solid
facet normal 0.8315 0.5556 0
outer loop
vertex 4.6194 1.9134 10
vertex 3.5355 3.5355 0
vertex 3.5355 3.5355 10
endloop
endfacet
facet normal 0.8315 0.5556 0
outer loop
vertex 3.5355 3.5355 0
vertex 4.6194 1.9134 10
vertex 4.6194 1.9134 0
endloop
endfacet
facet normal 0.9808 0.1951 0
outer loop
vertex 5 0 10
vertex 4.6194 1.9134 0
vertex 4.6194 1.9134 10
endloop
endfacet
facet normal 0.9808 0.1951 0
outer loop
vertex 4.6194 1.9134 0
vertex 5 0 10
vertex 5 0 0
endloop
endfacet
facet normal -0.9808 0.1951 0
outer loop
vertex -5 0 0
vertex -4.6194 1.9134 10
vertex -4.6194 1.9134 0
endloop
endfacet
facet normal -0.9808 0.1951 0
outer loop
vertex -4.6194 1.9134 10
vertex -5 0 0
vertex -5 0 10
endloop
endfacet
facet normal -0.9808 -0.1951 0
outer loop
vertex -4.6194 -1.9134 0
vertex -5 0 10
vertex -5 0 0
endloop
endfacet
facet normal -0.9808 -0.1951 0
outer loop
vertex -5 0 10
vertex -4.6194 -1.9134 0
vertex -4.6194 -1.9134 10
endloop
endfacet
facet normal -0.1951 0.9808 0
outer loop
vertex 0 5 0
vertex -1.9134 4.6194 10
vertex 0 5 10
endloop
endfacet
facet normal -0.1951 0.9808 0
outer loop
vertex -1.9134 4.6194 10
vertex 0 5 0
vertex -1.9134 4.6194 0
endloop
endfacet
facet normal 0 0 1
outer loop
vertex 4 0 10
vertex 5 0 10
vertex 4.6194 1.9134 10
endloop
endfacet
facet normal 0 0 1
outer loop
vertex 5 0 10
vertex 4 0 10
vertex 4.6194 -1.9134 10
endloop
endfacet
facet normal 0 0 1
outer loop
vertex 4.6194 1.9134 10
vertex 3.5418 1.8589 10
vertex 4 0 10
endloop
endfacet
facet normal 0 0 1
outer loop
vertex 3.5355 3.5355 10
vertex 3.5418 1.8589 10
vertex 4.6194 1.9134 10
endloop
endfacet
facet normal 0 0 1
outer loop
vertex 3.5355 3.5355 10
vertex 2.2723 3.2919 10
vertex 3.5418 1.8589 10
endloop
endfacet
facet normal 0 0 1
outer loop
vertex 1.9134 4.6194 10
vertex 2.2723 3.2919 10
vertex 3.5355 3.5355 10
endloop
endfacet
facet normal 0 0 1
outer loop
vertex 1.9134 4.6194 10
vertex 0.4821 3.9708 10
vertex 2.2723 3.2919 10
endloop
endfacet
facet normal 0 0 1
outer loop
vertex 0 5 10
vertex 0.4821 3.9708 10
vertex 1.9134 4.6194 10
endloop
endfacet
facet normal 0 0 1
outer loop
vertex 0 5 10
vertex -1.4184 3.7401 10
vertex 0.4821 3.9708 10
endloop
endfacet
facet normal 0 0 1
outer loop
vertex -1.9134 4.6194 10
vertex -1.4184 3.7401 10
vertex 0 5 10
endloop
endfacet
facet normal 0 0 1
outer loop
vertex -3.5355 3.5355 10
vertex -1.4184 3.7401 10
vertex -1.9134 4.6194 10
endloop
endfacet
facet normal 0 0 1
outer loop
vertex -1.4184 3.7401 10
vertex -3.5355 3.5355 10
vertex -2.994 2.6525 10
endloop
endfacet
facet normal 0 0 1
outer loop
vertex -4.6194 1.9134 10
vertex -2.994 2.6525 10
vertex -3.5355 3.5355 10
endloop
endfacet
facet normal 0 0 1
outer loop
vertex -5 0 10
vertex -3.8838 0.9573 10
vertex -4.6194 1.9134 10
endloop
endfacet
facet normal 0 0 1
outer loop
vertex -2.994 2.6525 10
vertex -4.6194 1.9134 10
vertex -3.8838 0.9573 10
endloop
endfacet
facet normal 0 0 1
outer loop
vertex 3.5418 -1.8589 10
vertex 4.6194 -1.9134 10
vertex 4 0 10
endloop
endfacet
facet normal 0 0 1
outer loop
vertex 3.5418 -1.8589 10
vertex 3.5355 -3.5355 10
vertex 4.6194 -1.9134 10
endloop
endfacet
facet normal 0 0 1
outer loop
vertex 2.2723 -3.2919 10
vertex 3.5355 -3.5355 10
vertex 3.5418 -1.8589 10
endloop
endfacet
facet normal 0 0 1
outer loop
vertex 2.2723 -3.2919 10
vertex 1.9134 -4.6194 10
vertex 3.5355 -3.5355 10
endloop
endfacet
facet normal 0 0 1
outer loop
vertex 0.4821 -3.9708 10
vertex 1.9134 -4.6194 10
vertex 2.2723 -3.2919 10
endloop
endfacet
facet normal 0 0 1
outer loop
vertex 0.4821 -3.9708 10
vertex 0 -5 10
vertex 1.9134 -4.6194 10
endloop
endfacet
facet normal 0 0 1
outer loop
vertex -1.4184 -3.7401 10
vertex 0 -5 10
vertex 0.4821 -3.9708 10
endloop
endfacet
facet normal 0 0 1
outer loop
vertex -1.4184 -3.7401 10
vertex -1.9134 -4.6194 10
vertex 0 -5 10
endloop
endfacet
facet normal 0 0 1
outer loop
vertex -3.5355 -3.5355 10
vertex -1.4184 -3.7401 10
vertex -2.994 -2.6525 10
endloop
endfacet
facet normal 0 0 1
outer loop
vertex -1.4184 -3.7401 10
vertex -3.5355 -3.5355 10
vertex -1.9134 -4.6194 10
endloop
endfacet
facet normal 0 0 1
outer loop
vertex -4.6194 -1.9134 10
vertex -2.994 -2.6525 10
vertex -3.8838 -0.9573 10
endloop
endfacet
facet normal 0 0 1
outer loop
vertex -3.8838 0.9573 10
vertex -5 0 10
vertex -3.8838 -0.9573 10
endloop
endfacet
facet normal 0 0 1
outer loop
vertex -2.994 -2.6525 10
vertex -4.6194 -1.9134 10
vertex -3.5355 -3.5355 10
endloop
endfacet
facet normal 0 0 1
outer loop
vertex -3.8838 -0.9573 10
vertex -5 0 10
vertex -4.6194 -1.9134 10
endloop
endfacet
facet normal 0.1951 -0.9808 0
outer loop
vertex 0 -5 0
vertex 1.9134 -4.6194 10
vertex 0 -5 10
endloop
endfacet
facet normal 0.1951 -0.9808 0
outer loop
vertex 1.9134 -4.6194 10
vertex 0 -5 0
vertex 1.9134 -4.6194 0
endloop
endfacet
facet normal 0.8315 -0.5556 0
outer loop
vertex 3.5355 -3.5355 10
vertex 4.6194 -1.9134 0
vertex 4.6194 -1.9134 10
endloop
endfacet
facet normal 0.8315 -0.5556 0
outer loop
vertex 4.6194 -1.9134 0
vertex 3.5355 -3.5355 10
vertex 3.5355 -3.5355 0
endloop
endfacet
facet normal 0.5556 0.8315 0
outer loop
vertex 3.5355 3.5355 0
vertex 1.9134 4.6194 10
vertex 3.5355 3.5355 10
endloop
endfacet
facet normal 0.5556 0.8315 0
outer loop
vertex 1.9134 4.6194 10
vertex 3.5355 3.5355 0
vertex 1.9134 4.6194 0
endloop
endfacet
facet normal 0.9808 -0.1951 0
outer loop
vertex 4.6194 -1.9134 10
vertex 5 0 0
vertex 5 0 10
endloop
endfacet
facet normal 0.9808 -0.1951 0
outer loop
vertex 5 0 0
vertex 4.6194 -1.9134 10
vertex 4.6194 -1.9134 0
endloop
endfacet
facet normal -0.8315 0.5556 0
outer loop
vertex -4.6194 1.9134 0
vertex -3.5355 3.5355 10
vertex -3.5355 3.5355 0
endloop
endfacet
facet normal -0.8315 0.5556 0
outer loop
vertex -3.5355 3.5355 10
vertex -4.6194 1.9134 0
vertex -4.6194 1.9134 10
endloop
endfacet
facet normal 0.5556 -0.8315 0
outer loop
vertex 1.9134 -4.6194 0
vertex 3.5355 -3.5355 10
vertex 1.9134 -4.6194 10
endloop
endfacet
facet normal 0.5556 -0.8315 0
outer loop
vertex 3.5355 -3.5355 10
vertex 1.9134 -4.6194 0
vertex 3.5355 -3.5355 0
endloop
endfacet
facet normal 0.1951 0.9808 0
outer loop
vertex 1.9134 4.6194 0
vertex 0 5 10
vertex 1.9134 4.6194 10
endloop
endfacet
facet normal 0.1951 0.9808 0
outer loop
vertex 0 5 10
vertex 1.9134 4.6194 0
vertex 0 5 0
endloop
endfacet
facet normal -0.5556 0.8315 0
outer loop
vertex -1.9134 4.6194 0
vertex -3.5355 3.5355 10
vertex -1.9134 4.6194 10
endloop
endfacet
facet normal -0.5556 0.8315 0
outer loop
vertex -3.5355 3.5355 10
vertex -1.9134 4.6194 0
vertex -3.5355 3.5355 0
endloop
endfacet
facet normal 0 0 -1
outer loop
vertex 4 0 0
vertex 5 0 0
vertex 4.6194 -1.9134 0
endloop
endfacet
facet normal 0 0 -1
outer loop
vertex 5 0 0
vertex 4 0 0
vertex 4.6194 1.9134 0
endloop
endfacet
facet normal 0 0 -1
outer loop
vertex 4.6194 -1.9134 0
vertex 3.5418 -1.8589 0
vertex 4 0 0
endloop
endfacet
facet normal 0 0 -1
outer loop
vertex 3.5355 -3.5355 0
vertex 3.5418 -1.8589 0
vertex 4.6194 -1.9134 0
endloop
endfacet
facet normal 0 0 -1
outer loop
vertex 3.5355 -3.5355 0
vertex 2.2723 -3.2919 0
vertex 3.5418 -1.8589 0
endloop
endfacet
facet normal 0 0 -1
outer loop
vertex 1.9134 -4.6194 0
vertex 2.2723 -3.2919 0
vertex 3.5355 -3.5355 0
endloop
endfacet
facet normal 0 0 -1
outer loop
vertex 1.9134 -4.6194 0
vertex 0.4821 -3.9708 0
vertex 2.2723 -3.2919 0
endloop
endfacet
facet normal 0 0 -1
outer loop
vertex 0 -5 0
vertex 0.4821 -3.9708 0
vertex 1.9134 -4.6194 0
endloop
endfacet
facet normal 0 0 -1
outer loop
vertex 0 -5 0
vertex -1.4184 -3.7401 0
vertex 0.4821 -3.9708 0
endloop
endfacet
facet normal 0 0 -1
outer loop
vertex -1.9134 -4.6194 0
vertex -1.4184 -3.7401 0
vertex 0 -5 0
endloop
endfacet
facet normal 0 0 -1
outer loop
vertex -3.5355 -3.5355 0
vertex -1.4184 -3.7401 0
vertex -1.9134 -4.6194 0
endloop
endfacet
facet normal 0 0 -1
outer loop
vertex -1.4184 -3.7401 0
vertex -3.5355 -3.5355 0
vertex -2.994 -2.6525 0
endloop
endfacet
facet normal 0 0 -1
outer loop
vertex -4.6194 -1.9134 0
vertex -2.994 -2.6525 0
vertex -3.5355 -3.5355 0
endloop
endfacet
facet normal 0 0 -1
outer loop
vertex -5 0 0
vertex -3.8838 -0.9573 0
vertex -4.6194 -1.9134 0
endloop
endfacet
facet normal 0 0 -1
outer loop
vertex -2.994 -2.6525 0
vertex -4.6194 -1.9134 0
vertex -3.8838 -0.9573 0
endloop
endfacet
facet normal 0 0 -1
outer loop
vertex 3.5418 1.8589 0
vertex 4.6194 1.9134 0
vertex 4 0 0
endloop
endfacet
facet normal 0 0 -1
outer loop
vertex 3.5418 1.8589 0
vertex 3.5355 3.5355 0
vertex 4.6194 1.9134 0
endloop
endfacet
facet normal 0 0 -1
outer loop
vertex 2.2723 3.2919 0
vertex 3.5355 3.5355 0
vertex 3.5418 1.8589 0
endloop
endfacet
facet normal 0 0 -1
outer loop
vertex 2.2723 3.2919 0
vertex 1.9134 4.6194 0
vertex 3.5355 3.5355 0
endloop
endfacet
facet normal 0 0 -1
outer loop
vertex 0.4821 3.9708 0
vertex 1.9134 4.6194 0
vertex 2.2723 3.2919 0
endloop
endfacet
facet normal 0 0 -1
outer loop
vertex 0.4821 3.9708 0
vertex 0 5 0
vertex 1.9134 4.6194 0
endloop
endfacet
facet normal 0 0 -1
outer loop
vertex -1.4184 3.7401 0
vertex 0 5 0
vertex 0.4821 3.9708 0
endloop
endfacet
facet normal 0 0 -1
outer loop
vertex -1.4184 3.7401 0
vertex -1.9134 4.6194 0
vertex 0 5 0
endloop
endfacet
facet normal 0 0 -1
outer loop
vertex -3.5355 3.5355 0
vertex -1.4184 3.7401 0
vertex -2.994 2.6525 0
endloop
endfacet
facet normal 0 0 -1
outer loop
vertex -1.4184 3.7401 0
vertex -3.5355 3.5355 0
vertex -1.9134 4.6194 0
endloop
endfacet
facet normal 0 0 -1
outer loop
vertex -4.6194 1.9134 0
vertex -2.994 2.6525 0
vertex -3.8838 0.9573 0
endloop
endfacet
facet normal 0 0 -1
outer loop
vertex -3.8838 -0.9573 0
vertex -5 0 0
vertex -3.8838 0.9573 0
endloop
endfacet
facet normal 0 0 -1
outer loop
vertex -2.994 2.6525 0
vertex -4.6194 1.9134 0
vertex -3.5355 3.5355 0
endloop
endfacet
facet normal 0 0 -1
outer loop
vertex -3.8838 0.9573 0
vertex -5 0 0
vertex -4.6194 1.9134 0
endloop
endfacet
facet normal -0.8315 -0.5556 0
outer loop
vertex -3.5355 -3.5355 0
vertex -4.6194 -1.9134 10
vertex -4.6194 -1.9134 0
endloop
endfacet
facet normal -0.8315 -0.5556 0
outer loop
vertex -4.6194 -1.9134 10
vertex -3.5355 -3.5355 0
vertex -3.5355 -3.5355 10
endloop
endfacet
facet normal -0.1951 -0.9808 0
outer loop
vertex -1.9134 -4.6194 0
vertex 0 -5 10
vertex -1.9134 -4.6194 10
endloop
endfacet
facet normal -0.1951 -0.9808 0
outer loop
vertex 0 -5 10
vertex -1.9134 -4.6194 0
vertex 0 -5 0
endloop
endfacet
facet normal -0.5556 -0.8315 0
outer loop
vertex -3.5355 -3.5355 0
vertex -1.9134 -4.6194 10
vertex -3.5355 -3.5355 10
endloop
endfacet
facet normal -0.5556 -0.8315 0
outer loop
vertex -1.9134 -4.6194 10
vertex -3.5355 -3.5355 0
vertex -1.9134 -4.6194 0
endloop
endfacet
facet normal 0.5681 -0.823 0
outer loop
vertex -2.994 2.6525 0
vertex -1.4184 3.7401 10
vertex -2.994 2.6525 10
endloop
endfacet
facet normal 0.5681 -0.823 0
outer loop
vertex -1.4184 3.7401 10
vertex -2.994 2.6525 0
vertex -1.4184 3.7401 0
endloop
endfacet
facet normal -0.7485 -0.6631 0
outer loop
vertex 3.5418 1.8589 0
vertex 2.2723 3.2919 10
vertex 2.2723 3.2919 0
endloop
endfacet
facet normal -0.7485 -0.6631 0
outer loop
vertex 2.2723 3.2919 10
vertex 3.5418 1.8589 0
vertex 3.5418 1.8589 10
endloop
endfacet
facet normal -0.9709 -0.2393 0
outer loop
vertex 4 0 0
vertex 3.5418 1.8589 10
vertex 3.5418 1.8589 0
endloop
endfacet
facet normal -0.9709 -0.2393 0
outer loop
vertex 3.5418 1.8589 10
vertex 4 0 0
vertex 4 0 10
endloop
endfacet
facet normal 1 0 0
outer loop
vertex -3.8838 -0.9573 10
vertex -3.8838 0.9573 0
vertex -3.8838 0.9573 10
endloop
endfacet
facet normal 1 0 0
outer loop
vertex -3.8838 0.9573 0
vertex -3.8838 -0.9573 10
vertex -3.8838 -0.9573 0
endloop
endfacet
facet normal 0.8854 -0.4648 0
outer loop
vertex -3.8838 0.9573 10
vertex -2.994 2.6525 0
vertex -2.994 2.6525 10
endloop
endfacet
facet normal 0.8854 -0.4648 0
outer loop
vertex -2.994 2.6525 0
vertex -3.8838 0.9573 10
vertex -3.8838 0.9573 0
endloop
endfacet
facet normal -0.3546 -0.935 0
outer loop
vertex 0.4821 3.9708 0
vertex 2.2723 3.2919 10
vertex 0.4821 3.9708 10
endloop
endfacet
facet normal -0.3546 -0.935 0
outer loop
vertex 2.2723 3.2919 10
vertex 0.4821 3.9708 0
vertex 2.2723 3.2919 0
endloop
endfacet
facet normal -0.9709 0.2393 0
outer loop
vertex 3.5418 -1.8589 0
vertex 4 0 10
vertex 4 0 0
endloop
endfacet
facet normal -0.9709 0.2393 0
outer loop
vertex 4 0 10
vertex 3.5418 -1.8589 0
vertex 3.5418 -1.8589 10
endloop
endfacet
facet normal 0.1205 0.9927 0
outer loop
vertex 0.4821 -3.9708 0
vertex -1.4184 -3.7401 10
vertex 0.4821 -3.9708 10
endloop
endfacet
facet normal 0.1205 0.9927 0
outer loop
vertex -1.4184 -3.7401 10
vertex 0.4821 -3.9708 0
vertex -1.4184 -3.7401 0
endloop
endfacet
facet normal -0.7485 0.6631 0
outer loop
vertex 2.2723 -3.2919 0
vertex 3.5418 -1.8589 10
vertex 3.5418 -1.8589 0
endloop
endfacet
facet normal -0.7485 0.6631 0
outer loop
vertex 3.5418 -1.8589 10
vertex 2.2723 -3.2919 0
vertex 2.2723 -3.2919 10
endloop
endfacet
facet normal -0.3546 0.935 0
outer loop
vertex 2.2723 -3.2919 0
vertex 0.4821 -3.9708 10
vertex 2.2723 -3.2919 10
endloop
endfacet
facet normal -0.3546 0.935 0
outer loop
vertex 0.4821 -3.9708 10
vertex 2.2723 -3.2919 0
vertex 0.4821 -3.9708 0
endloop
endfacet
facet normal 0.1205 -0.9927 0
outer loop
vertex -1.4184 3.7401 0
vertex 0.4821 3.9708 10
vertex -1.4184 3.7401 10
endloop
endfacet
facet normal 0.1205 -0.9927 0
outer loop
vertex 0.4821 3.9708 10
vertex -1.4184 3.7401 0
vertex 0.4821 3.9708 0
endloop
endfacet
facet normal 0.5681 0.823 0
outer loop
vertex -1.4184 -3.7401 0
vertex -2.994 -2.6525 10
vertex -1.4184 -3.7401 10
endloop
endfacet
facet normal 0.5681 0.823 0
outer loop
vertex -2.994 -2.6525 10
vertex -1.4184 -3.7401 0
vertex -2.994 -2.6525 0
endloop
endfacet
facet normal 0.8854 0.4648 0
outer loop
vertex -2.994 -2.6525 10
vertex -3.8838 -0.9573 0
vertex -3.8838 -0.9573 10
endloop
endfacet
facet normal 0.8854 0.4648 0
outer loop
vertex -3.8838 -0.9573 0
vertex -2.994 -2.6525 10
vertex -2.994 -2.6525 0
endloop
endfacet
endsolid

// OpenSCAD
module ring(r1, r2, h) {
    difference() {
            cylinder(r = r1, h = h);
                    translate([ 0, 0, -1 ]) cylinder(r = r2, h = h+2);
                        }
                        }

                        ring(5, 4, 10);
